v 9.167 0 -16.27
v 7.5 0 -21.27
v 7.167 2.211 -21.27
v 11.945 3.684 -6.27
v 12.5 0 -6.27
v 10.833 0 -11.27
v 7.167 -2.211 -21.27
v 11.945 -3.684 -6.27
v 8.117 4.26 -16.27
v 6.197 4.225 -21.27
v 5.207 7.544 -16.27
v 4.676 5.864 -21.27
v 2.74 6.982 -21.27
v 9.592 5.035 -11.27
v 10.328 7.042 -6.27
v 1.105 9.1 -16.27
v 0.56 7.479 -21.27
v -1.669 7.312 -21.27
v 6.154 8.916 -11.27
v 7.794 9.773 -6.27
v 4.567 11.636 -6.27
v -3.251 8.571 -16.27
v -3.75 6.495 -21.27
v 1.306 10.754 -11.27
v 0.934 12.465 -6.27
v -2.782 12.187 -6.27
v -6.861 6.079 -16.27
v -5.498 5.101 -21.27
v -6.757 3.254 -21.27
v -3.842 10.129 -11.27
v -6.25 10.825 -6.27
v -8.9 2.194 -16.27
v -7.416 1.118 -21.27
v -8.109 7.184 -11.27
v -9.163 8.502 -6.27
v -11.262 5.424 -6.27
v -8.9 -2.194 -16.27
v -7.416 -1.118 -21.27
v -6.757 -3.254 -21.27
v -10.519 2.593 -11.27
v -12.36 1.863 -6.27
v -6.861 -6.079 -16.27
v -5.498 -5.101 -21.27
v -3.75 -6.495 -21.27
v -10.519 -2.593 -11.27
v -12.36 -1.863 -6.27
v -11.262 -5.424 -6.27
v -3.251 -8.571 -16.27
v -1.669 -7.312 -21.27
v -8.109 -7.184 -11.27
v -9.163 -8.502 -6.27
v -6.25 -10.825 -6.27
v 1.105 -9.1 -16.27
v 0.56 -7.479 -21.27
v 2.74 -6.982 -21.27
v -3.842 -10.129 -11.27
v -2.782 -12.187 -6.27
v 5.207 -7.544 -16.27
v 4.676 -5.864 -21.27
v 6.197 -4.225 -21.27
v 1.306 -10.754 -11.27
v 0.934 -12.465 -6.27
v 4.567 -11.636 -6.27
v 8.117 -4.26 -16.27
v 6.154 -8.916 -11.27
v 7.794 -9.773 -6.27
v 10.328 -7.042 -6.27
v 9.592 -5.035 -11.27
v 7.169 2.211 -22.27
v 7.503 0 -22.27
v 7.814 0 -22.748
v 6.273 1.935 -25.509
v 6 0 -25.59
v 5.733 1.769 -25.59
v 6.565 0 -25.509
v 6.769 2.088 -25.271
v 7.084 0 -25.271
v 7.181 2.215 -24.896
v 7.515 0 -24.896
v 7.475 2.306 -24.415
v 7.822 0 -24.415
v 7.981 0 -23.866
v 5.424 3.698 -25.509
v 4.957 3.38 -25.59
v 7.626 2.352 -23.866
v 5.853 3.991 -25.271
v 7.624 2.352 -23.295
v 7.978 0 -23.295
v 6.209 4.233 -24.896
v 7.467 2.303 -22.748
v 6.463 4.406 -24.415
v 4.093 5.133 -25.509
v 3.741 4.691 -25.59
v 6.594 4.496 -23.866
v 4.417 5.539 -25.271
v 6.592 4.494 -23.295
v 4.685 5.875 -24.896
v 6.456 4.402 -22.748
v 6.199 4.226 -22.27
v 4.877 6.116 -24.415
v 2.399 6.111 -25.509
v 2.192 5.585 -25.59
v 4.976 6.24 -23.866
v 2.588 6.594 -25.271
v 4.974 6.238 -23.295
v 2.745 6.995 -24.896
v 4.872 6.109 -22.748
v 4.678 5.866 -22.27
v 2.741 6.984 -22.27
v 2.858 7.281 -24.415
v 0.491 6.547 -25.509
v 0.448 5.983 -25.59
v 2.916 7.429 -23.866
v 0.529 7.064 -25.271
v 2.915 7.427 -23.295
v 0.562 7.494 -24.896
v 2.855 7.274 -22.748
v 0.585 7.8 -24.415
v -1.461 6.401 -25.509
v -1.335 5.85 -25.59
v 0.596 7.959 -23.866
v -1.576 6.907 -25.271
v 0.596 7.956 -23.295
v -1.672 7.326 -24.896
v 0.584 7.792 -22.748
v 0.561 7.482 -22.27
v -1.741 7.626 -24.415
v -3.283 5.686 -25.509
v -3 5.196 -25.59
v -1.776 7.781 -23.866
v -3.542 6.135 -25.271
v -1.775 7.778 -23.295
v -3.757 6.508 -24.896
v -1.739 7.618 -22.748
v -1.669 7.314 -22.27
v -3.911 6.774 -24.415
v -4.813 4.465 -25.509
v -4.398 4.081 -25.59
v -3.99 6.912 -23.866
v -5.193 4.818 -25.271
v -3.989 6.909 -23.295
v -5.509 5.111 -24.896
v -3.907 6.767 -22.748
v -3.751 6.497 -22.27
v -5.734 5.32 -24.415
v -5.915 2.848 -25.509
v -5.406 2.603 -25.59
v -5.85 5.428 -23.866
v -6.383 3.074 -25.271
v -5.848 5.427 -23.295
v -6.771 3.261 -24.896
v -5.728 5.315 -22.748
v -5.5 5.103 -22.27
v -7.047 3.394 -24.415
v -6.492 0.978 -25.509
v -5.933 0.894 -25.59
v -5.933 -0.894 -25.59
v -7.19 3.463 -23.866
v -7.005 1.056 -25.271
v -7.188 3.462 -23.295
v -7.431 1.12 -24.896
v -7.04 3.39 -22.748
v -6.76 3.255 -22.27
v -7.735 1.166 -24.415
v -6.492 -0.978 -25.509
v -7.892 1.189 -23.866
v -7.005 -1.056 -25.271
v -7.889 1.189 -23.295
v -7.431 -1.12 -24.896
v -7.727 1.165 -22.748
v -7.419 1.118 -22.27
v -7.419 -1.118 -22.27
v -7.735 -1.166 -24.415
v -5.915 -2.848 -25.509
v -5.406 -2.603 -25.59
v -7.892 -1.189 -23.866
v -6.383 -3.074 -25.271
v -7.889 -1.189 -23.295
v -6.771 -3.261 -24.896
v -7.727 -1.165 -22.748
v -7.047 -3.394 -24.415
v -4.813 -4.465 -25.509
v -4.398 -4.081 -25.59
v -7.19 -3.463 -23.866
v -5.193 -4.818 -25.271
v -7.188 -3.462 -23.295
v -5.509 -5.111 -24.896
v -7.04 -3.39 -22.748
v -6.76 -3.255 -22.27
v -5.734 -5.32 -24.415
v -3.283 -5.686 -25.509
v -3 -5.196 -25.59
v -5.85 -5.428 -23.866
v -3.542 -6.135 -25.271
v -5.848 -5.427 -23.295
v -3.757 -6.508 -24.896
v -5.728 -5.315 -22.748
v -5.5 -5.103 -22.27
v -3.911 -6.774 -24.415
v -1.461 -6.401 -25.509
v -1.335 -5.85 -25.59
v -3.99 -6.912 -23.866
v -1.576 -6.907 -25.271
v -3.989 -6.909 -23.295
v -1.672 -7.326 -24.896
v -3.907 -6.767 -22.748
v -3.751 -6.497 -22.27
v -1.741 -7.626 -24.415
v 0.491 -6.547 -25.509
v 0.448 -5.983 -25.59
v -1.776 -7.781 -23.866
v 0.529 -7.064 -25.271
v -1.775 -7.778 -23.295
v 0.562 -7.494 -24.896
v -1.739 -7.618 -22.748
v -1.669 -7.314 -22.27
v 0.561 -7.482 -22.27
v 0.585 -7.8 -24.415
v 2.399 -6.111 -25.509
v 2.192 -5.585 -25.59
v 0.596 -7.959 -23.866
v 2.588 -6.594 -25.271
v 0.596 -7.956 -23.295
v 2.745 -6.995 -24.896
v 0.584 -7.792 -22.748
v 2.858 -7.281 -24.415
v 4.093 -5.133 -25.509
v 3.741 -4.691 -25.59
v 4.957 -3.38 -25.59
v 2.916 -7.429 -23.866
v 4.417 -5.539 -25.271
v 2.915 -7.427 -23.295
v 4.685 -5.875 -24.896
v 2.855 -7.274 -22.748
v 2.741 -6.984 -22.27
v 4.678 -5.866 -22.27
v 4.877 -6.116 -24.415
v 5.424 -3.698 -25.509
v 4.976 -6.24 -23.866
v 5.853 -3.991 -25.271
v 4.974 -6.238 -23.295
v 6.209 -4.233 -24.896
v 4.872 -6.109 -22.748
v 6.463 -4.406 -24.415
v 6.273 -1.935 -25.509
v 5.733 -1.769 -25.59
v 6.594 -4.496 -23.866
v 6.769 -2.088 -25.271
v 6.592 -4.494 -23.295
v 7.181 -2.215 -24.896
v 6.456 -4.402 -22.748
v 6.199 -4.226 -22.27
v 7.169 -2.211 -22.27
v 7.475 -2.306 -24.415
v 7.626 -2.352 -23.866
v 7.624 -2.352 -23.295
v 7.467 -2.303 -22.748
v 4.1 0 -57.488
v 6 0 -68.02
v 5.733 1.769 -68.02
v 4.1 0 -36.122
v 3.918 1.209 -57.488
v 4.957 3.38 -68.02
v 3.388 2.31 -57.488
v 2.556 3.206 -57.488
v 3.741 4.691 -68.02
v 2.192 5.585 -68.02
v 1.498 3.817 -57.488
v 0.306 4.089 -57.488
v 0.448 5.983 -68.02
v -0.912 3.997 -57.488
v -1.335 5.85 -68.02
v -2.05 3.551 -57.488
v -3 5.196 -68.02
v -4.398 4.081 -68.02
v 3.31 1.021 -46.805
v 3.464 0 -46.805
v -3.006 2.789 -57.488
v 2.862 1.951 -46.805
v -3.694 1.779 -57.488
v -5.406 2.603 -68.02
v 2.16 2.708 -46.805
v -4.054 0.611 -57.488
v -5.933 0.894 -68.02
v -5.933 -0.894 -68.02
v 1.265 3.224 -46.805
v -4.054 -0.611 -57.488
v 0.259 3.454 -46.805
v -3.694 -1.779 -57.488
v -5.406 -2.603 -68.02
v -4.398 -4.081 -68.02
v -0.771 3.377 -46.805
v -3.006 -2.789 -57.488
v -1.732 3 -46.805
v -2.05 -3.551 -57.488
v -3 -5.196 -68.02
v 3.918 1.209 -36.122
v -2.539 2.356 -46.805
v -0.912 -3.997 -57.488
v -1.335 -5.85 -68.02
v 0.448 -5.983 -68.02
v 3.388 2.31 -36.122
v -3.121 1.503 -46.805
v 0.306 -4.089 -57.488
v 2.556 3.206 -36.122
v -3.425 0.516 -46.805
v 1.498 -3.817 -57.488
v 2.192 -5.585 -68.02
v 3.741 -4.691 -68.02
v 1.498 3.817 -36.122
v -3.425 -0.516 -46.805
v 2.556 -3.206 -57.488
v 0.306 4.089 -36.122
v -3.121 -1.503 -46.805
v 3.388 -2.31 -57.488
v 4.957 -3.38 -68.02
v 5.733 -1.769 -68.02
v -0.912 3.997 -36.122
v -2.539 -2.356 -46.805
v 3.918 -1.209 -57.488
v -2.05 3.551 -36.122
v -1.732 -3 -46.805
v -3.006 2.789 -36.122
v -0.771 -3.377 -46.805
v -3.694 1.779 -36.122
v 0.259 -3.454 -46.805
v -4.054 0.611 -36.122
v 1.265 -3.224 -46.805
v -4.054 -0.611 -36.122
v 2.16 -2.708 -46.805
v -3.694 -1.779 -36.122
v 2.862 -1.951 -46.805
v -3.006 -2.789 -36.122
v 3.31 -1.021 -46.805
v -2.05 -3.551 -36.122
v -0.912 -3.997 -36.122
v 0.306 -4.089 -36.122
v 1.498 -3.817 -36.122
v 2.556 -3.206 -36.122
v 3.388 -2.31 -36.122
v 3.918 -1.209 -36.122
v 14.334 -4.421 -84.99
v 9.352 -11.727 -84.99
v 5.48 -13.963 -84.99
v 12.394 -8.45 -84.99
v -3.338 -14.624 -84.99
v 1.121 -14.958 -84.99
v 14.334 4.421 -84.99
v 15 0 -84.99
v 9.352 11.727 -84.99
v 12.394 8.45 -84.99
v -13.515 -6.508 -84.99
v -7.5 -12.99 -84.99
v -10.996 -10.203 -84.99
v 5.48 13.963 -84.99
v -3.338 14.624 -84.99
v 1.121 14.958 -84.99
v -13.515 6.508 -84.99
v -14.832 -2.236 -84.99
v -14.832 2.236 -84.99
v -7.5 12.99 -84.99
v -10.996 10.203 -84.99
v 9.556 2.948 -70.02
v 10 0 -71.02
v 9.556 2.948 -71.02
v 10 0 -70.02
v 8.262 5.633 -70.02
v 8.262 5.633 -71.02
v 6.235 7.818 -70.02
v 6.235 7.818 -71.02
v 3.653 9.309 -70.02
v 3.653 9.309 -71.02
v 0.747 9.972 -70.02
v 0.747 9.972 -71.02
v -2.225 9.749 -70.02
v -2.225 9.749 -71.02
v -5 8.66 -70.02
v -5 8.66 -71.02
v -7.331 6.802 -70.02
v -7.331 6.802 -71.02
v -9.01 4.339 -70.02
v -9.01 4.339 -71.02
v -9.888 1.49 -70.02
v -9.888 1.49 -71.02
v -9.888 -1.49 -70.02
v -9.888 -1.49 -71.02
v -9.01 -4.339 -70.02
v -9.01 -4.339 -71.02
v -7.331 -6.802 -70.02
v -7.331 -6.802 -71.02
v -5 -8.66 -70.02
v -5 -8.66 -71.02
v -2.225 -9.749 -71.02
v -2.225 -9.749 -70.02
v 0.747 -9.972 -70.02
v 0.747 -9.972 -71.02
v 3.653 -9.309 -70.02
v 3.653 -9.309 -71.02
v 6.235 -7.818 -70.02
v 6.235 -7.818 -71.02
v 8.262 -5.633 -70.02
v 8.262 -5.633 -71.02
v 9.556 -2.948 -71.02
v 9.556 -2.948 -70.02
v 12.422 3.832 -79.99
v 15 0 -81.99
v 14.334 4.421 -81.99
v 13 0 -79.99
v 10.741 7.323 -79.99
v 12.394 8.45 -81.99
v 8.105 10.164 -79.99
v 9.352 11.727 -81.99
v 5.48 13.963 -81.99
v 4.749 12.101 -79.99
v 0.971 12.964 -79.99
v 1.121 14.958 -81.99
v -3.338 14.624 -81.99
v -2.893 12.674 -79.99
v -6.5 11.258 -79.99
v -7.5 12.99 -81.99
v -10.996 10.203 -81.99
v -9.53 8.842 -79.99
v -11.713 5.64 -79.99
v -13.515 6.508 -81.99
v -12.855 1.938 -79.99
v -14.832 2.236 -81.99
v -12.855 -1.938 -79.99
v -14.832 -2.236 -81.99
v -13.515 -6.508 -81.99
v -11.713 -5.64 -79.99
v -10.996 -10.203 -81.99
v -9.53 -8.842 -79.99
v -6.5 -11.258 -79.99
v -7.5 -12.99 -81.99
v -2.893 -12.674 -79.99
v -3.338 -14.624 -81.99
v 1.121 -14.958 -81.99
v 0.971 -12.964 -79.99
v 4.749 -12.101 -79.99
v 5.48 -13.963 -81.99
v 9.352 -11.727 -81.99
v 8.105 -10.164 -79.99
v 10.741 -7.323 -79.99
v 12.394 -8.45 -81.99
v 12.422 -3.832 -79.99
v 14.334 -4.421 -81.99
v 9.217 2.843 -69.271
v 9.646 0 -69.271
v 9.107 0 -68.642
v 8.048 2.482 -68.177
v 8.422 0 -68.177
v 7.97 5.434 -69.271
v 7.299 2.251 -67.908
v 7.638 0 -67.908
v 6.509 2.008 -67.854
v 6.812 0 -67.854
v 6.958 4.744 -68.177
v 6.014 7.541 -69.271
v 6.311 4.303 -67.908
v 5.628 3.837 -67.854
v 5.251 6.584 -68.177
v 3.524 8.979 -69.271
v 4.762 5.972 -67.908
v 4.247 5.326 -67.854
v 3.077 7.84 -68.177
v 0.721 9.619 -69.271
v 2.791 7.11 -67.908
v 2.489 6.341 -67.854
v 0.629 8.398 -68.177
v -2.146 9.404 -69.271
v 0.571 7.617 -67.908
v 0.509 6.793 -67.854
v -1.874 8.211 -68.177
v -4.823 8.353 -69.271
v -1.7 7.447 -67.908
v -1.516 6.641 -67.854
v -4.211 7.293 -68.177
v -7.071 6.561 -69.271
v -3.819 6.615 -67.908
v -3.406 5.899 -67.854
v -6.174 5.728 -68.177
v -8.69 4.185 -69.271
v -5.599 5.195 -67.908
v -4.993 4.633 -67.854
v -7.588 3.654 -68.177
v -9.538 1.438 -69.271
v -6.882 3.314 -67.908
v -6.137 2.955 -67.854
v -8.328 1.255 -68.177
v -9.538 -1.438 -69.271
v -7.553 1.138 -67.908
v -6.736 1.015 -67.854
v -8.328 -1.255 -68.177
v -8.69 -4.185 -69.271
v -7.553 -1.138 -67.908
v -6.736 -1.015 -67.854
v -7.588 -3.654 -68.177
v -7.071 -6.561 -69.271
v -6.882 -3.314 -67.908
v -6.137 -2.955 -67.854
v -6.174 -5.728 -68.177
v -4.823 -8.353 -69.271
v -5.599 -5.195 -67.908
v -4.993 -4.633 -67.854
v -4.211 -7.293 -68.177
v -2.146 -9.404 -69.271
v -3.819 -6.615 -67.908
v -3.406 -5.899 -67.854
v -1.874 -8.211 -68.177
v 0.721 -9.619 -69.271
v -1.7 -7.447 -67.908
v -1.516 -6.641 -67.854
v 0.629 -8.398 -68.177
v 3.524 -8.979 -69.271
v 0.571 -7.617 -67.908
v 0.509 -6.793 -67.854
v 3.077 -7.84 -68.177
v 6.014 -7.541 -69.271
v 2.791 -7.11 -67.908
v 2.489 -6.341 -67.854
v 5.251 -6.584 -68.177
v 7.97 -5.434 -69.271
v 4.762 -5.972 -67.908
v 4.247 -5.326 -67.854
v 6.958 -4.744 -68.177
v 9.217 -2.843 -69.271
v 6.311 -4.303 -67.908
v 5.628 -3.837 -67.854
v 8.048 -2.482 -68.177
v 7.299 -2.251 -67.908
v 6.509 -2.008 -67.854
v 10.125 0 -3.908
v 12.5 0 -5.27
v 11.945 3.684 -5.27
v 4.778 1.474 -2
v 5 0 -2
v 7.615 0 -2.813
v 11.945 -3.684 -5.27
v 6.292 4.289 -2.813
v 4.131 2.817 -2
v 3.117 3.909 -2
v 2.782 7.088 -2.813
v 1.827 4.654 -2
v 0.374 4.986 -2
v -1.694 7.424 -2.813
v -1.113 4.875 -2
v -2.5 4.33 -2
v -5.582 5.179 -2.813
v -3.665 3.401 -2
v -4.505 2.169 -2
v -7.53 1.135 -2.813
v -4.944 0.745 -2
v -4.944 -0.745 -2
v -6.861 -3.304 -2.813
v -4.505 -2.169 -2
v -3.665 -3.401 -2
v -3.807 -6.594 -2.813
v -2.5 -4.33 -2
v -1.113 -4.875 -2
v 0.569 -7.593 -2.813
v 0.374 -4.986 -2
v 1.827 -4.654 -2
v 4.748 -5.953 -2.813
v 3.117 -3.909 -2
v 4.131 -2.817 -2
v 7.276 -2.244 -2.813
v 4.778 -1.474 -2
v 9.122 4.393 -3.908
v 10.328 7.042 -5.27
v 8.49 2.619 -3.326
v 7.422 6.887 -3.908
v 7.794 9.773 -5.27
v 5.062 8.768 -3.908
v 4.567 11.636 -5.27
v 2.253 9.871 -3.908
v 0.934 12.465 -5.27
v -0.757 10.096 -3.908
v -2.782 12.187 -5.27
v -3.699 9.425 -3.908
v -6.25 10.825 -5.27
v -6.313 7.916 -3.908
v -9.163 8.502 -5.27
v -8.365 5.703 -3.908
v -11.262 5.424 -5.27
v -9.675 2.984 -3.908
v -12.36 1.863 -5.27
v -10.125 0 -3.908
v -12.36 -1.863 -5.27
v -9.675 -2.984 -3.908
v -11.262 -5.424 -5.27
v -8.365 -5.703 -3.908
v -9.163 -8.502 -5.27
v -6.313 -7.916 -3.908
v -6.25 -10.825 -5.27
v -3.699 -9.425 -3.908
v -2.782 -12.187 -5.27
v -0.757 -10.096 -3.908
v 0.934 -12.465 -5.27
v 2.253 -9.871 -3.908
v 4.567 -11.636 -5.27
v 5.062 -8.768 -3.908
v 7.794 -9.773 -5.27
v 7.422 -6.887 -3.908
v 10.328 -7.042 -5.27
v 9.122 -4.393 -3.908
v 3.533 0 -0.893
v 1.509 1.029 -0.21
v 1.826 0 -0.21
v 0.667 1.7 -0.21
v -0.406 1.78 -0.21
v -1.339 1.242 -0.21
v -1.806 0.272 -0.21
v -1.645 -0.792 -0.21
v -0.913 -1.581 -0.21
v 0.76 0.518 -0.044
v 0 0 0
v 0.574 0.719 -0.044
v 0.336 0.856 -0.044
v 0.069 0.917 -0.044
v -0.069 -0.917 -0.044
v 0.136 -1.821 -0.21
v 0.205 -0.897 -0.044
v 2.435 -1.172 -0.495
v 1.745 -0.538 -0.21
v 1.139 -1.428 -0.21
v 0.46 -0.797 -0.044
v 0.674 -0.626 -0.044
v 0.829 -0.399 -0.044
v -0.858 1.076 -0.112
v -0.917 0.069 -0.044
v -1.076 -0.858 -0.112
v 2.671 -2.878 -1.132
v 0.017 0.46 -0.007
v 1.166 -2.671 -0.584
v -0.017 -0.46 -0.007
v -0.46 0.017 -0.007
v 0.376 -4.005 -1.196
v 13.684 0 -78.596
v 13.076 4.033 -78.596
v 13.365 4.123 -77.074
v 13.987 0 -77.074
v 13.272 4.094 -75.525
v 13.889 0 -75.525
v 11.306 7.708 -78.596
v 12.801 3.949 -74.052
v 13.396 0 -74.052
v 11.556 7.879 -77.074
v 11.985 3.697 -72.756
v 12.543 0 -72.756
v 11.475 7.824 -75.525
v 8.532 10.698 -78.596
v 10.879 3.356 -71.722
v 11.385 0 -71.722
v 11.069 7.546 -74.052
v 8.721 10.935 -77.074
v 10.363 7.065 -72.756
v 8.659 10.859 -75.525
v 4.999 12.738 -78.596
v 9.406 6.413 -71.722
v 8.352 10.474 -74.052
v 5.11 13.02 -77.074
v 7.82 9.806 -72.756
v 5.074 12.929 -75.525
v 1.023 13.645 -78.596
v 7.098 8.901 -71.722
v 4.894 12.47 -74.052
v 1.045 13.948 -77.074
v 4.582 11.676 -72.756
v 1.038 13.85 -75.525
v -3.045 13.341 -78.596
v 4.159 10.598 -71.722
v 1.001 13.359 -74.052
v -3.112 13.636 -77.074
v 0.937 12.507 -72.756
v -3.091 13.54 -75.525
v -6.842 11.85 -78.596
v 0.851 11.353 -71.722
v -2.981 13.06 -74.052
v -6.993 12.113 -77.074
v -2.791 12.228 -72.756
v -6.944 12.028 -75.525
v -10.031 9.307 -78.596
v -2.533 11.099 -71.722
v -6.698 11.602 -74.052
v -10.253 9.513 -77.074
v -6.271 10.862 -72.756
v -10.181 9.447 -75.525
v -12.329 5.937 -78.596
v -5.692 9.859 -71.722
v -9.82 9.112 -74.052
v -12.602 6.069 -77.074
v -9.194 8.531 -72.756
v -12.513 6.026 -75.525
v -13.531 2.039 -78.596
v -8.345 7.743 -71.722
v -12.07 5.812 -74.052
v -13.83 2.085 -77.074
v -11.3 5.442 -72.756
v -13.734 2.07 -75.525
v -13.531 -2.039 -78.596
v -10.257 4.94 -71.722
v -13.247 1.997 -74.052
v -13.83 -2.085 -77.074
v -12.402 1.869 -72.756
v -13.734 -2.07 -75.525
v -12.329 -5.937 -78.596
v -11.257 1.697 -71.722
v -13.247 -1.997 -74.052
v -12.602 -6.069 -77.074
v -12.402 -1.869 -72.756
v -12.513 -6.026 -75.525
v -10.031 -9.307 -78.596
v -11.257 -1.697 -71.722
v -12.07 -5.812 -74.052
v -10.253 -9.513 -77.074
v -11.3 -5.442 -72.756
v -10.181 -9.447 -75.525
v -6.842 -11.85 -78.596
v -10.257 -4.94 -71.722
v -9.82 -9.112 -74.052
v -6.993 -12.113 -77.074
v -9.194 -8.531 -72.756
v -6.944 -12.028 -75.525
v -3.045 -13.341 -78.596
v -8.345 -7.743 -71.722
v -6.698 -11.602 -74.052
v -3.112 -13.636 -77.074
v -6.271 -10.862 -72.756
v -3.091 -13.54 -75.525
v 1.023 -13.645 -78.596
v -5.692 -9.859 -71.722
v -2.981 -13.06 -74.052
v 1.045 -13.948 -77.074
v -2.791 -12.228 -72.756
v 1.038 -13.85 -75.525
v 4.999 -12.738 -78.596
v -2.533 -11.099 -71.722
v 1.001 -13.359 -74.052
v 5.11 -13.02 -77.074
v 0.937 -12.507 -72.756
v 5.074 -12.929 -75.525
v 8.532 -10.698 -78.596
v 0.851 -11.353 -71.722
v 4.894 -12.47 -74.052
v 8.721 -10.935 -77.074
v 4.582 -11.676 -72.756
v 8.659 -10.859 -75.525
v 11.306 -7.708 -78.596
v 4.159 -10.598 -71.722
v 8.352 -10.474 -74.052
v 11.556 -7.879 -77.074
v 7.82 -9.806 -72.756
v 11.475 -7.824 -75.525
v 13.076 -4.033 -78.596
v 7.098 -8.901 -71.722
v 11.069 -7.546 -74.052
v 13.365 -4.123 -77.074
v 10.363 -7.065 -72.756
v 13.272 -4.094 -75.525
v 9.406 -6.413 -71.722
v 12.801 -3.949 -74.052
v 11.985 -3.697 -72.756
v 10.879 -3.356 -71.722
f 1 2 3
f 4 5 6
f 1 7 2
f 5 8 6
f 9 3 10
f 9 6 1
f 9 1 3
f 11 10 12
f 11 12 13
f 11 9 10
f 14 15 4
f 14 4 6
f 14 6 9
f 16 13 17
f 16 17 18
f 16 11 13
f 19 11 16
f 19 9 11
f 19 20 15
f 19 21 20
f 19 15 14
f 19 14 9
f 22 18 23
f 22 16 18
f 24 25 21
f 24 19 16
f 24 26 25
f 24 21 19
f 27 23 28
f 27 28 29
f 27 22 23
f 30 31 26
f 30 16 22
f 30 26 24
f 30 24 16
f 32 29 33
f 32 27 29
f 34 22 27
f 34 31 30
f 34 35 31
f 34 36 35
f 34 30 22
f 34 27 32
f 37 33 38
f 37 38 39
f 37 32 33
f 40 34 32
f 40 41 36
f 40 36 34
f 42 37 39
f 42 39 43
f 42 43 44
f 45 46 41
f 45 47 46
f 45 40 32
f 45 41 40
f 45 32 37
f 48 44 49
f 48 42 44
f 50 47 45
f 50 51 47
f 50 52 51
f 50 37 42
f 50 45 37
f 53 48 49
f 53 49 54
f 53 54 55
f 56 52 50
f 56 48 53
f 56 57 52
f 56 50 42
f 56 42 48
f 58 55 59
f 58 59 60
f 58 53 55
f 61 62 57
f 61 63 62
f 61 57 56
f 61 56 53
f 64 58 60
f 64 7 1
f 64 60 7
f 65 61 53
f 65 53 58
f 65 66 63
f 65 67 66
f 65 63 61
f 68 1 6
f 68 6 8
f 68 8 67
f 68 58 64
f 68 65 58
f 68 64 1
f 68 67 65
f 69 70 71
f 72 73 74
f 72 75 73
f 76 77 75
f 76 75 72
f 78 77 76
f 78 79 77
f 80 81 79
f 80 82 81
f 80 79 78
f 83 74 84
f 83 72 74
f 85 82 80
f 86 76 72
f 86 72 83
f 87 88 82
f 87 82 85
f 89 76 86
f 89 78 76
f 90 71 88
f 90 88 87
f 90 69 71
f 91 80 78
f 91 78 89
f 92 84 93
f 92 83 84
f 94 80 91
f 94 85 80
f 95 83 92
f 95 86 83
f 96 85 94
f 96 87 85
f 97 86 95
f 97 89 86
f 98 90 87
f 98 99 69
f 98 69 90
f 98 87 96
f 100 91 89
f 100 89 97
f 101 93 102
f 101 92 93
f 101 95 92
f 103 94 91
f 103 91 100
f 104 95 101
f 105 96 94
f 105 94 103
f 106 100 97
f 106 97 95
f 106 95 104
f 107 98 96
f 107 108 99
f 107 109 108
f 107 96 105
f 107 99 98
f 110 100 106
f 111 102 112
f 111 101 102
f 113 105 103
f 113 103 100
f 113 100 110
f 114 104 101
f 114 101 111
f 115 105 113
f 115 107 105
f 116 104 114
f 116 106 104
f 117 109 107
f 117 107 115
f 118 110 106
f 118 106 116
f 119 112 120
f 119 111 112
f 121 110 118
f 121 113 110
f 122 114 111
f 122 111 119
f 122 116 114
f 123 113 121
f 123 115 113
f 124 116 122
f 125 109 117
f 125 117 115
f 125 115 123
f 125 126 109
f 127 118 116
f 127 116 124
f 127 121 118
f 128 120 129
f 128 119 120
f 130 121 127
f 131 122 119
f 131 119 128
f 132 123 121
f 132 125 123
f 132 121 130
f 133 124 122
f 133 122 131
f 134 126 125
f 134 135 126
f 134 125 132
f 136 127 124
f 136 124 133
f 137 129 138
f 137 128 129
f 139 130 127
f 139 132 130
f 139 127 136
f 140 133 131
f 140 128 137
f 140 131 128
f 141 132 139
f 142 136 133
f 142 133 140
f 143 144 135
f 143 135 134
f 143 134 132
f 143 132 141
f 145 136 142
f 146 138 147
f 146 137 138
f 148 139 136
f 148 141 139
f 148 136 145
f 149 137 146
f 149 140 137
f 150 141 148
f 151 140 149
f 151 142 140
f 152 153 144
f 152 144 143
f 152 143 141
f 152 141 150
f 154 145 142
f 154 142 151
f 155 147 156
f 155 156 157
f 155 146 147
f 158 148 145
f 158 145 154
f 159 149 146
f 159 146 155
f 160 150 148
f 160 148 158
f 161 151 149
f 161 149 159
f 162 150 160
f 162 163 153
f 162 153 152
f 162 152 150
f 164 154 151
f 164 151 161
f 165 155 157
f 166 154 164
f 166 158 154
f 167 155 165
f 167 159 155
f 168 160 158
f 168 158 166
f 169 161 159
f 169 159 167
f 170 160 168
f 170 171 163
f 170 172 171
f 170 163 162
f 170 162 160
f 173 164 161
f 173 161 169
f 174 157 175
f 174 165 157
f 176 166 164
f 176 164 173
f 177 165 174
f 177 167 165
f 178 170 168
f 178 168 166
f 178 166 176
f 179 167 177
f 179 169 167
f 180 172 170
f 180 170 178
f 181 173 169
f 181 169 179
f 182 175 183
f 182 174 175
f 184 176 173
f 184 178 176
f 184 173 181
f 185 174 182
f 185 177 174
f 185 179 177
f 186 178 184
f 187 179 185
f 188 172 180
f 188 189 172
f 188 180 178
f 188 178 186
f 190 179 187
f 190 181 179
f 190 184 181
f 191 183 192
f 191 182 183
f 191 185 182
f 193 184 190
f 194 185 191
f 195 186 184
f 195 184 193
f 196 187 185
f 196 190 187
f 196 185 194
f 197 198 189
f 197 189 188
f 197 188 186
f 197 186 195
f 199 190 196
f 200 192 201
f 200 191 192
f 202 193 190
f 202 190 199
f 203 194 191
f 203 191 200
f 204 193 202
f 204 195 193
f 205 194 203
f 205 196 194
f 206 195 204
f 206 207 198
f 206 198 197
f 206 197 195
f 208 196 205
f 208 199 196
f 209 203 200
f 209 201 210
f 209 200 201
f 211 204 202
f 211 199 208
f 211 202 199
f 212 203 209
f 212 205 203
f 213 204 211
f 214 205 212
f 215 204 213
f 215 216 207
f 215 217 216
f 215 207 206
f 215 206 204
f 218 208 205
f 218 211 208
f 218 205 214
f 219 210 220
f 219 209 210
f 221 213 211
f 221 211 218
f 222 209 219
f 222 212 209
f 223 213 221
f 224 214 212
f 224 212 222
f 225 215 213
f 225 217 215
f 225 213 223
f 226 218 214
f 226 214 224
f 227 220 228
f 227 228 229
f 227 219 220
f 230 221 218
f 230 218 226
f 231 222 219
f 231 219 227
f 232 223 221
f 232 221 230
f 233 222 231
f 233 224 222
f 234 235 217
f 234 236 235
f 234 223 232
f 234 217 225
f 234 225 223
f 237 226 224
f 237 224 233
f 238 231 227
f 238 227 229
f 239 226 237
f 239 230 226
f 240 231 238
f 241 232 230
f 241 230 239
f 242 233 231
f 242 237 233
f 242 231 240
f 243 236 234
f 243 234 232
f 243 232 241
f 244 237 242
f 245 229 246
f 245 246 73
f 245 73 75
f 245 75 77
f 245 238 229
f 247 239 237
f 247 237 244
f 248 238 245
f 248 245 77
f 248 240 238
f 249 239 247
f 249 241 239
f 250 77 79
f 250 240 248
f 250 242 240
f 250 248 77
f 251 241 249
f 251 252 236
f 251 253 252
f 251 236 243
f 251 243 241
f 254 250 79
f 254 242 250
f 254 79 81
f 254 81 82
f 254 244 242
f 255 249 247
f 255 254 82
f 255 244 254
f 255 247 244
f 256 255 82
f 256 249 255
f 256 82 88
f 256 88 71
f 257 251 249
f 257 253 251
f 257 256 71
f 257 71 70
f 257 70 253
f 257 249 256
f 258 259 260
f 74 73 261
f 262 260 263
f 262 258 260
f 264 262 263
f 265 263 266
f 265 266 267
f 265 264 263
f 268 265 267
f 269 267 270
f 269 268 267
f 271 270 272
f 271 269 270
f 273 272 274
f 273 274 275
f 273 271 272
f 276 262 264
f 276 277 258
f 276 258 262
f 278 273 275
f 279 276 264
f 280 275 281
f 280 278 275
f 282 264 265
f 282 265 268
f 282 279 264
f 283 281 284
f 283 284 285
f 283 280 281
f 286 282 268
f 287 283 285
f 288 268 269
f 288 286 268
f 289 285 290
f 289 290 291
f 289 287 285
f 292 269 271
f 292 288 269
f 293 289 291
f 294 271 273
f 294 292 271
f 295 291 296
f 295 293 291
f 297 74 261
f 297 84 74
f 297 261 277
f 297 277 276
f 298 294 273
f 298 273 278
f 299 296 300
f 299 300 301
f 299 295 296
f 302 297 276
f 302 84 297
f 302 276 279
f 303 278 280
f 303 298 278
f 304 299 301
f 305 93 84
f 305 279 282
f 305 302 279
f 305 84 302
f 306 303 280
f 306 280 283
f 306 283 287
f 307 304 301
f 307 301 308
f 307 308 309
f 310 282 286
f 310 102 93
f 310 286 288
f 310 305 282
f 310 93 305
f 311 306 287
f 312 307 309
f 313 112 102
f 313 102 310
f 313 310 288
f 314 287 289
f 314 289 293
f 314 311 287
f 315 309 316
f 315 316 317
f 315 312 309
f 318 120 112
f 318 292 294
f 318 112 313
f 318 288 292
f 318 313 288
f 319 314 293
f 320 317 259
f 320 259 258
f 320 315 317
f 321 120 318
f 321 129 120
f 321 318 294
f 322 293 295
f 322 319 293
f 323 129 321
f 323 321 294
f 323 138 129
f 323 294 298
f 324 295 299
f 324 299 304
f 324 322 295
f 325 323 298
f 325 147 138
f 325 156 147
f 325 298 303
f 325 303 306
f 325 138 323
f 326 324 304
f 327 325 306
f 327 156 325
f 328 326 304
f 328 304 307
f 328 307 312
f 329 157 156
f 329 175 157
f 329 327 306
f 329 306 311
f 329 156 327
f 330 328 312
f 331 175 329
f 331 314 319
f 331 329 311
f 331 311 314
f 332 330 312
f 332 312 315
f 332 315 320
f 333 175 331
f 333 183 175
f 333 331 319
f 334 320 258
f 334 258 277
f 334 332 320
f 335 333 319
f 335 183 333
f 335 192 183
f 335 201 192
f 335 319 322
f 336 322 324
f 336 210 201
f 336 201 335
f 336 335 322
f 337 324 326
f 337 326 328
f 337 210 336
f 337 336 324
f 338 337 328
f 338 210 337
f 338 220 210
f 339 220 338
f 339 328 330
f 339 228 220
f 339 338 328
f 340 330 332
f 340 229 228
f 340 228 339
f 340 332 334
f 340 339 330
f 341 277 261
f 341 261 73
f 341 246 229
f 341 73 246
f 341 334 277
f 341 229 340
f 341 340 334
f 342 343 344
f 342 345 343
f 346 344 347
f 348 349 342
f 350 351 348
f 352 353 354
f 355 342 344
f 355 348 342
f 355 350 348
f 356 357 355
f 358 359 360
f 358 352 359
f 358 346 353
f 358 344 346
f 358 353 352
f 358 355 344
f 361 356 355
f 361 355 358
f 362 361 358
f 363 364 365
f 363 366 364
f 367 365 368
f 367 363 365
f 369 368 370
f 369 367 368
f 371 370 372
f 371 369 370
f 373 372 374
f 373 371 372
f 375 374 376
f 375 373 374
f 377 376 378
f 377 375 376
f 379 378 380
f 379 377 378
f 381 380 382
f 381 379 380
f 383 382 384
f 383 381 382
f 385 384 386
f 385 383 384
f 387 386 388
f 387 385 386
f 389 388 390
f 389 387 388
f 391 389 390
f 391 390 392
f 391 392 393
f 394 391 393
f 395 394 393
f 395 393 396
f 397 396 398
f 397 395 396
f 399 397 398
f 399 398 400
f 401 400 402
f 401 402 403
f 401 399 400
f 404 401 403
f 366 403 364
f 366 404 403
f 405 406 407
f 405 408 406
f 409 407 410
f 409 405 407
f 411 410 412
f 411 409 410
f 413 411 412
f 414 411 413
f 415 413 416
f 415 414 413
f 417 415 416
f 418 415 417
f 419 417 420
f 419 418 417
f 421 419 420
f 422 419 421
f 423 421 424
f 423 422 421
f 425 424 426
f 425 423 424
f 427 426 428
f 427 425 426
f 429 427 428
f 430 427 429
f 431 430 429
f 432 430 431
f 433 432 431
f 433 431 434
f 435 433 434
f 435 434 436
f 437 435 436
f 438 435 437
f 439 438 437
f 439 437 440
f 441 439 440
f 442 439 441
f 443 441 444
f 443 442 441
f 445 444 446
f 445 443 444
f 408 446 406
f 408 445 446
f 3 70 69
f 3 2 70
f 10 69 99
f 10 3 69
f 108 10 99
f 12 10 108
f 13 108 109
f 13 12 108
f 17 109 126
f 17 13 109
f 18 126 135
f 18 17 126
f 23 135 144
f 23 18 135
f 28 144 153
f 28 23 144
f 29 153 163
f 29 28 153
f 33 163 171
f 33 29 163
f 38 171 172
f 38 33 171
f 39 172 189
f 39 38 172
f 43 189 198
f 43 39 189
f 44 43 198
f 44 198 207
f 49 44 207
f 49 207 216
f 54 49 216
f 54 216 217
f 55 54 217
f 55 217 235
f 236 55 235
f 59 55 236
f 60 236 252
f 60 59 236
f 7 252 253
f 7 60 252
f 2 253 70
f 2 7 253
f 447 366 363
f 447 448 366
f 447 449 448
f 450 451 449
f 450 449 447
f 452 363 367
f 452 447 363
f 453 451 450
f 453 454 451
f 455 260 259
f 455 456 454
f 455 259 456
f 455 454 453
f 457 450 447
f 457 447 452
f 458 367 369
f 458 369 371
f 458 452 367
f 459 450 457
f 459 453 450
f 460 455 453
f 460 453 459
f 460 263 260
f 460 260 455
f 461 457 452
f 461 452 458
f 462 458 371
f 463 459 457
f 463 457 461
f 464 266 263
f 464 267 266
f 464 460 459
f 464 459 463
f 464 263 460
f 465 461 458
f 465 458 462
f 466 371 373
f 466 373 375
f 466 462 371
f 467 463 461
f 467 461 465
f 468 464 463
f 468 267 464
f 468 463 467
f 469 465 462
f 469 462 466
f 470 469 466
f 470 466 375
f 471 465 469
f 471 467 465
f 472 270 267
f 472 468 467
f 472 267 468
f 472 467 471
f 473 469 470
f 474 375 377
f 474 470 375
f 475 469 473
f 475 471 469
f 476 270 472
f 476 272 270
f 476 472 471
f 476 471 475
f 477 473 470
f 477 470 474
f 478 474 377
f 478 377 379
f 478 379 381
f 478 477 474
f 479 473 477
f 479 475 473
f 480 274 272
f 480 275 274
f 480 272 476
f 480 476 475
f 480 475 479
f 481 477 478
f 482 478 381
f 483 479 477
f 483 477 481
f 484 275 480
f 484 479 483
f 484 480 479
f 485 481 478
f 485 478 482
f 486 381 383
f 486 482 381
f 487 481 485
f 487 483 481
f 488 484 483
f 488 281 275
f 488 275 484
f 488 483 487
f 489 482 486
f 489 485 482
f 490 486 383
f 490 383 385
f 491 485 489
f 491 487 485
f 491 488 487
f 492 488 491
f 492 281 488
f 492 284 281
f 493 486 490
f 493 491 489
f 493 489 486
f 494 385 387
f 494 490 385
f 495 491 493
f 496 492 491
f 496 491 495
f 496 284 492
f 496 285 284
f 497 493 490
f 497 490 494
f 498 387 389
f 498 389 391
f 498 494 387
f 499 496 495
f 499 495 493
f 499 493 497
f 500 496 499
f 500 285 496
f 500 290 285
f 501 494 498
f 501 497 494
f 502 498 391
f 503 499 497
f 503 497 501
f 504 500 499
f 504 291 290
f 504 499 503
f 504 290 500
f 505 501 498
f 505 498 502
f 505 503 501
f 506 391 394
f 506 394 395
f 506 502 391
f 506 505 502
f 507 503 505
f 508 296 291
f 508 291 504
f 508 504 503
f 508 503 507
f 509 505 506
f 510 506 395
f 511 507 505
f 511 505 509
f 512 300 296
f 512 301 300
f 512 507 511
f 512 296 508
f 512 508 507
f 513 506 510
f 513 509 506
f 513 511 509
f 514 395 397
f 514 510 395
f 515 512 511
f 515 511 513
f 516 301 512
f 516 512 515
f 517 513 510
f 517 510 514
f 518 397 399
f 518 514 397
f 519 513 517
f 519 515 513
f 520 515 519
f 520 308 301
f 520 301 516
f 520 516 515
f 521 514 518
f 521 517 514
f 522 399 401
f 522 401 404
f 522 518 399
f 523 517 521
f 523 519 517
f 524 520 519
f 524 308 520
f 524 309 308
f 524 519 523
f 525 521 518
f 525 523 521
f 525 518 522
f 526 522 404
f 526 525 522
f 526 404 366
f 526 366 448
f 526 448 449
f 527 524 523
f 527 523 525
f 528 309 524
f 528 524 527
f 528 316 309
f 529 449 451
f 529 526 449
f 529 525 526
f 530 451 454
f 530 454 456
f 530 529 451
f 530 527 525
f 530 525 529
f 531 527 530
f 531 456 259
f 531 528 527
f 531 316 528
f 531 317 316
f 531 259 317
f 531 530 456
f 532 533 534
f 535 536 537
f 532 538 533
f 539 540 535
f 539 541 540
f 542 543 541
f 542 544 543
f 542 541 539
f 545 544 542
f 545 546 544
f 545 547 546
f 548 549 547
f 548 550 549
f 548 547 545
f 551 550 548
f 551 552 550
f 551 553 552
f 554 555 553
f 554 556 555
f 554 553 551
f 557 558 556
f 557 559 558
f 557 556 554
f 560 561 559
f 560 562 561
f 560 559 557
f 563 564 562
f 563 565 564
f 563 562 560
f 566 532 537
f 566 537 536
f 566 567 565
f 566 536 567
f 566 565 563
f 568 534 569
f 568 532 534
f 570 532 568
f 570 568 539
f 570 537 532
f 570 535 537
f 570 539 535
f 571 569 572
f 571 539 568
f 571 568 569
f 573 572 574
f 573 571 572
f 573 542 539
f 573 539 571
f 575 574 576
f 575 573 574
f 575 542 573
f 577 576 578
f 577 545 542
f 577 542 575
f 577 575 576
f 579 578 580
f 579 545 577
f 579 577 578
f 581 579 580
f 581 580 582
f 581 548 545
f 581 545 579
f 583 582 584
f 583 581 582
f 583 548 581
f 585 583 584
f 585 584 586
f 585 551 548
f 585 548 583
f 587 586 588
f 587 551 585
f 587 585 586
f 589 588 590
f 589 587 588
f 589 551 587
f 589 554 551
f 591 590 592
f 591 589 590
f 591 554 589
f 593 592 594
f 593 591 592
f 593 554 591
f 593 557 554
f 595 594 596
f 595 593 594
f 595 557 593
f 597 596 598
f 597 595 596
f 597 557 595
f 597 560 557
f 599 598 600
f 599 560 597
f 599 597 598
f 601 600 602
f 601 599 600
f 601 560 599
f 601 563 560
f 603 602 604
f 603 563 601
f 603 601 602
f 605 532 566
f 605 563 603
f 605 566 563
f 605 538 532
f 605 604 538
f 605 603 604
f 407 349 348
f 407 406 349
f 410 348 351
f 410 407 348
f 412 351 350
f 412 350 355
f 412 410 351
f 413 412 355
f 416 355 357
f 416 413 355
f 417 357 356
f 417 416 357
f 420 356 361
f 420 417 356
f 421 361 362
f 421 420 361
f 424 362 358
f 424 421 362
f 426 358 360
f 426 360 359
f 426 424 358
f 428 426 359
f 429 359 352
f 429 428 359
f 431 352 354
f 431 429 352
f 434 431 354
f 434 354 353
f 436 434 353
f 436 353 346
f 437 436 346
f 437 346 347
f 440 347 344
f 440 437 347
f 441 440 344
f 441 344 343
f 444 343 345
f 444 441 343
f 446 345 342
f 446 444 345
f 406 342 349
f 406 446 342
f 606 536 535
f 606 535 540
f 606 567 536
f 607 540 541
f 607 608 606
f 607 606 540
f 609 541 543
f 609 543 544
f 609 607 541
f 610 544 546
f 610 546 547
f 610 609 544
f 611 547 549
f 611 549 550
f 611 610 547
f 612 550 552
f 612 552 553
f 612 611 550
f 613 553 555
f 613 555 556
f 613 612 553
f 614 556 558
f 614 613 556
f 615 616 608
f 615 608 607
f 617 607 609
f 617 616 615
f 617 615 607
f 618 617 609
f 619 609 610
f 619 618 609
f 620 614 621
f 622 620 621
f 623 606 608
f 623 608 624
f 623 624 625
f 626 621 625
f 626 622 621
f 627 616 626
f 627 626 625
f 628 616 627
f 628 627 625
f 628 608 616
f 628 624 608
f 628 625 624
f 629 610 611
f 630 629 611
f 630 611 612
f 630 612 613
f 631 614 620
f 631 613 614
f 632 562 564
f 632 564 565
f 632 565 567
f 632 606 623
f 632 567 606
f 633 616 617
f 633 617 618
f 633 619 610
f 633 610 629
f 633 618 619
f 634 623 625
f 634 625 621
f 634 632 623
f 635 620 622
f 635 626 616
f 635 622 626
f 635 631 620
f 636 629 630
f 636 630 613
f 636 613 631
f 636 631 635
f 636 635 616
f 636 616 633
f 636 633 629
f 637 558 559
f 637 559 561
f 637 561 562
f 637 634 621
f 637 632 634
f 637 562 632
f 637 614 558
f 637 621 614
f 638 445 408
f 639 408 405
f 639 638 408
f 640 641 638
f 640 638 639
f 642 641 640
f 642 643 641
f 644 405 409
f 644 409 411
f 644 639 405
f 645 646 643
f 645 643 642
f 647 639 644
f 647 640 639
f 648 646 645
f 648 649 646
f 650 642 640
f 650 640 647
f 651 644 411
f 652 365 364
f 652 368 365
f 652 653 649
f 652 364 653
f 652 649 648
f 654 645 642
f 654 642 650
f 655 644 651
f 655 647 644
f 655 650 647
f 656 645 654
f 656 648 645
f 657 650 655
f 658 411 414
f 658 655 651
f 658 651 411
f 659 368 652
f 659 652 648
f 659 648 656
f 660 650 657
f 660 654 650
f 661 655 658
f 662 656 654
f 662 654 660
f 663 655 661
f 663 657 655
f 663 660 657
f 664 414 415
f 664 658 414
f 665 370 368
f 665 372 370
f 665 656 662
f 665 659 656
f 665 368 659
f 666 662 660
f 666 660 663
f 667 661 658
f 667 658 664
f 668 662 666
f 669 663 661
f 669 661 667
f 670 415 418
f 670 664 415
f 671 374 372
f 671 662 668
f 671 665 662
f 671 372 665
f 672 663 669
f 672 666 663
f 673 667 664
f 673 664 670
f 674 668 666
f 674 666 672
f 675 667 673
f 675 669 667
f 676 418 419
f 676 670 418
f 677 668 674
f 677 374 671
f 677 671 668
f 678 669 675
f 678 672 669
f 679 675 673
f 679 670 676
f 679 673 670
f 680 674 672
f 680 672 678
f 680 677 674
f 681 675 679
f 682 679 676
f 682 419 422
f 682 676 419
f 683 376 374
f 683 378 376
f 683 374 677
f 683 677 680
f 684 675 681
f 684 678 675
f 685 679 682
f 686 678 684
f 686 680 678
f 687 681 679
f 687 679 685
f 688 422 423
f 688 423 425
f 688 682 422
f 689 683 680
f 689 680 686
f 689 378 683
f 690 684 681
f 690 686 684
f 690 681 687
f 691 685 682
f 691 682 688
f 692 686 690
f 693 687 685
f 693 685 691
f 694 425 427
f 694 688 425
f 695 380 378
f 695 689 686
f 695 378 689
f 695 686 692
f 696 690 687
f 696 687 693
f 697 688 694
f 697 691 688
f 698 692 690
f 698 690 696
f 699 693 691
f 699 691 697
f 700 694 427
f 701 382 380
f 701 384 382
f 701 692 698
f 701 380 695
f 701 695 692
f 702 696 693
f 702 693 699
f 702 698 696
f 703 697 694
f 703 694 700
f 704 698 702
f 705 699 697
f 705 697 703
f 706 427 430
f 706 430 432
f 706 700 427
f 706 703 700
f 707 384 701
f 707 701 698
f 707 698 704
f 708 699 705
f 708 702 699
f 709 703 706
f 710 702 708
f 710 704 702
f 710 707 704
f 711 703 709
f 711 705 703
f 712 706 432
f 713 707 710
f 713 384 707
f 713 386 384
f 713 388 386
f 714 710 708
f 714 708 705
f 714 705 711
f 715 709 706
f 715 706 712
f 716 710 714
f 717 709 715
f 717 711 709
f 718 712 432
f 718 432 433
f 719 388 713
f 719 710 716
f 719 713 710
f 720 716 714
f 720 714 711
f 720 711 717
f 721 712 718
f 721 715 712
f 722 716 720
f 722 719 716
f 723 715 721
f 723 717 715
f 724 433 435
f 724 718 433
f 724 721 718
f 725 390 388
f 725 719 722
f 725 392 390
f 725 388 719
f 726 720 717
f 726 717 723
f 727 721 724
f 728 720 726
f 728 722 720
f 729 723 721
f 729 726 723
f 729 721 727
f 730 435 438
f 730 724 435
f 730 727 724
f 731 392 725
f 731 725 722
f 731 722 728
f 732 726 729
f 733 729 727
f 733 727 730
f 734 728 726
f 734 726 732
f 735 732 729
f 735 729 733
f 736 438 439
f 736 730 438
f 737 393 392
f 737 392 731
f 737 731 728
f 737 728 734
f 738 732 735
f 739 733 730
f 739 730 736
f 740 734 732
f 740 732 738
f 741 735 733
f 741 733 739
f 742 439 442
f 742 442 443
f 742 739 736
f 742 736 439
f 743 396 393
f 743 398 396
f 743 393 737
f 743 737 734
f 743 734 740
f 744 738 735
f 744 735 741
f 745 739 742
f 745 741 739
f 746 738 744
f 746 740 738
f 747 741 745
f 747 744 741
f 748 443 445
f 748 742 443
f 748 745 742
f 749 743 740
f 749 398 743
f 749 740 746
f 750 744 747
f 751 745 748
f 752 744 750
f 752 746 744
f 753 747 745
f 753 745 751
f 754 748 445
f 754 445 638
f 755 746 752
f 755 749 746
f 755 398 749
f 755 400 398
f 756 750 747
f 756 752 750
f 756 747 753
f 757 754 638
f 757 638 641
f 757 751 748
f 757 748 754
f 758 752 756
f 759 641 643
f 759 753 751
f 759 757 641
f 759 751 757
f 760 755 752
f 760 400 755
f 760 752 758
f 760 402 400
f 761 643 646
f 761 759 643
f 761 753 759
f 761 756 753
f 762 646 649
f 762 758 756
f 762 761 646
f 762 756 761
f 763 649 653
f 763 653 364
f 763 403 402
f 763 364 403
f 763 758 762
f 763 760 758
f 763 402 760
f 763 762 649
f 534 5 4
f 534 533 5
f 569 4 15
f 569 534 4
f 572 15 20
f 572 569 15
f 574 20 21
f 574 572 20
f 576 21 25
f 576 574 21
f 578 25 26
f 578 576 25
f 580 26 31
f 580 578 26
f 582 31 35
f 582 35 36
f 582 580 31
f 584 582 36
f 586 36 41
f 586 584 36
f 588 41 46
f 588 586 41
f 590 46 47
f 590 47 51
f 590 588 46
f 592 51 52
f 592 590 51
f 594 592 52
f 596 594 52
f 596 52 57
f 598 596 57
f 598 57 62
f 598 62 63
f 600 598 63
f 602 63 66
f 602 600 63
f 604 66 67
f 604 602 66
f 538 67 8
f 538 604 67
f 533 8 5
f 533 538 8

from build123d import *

# Parameters (mm, degrees)
F0_W   = 12.5
F0_H   = 1
F0_W_2 = 10
F0_W_3 = 15
F0_H_2 = 3


with BuildPart() as f1:
    # F0 (on Front) → F1 (revolve)
    with BuildSketch(Plane.XZ):
        with BuildLine():
            Line((0, -5.27), (12.5, -5.27))
            ThreePointArc((12.5, -5.27), (8.884681, -3.326098), (5, -2))
            ThreePointArc((5, -2), (2.702104, -0.494741), (0, 0))
            Line((0, 0), (0, -5.27))
        make_face()
        with Locations((6.25, -5.77)):
            Rectangle(F0_W, F0_H)
        Polygon((7.5, -21.27), (12.5, -6.27), (0, -6.27), (0, -21.27), align=None)
        Polygon((7.502531, -22.27), (7.5, -21.27), (0, -21.27), (0, -22.27), align=None)
        with BuildLine():
            ThreePointArc((6, -25.59), (7.822087, -24.414621), (7.502531, -22.27))
            Line((7.502531, -22.27), (0, -22.27))
            Line((0, -22.27), (0, -25.59))
            Line((0, -25.59), (6, -25.59))
        make_face()
        with BuildLine():
            ThreePointArc((6, -68.02), (3.463843, -46.805), (6, -25.59))
            Line((6, -25.59), (0, -25.59))
            Line((0, -25.59), (0, -68.02))
            Line((0, -68.02), (6, -68.02))
        make_face()
        with BuildLine():
            ThreePointArc((10, -70.02), (8.421705, -68.176591), (6, -68.02))
            Line((6, -68.02), (0, -68.02))
            Line((0, -68.02), (0, -70.02))
            Line((0, -70.02), (10, -70.02))
        make_face()
        with Locations((5, -70.52)):
            Rectangle(F0_W_2, F0_H)
        with BuildLine():
            ThreePointArc((13, -79.99), (13.690372, -74.772434), (10, -71.02))
            Line((10, -71.02), (0, -71.02))
            Line((0, -71.02), (0, -79.99))
            Line((0, -79.99), (13, -79.99))
        make_face()
        Polygon((15, -81.99), (13, -79.99), (0, -79.99), (0, -81.99), align=None)
        with Locations((7.5, -83.49)):
            Rectangle(F0_W_3, F0_H_2)
    revolve(axis=Axis((0, 0, -42.495), (0, 0, 1)))


solid = f1.part
